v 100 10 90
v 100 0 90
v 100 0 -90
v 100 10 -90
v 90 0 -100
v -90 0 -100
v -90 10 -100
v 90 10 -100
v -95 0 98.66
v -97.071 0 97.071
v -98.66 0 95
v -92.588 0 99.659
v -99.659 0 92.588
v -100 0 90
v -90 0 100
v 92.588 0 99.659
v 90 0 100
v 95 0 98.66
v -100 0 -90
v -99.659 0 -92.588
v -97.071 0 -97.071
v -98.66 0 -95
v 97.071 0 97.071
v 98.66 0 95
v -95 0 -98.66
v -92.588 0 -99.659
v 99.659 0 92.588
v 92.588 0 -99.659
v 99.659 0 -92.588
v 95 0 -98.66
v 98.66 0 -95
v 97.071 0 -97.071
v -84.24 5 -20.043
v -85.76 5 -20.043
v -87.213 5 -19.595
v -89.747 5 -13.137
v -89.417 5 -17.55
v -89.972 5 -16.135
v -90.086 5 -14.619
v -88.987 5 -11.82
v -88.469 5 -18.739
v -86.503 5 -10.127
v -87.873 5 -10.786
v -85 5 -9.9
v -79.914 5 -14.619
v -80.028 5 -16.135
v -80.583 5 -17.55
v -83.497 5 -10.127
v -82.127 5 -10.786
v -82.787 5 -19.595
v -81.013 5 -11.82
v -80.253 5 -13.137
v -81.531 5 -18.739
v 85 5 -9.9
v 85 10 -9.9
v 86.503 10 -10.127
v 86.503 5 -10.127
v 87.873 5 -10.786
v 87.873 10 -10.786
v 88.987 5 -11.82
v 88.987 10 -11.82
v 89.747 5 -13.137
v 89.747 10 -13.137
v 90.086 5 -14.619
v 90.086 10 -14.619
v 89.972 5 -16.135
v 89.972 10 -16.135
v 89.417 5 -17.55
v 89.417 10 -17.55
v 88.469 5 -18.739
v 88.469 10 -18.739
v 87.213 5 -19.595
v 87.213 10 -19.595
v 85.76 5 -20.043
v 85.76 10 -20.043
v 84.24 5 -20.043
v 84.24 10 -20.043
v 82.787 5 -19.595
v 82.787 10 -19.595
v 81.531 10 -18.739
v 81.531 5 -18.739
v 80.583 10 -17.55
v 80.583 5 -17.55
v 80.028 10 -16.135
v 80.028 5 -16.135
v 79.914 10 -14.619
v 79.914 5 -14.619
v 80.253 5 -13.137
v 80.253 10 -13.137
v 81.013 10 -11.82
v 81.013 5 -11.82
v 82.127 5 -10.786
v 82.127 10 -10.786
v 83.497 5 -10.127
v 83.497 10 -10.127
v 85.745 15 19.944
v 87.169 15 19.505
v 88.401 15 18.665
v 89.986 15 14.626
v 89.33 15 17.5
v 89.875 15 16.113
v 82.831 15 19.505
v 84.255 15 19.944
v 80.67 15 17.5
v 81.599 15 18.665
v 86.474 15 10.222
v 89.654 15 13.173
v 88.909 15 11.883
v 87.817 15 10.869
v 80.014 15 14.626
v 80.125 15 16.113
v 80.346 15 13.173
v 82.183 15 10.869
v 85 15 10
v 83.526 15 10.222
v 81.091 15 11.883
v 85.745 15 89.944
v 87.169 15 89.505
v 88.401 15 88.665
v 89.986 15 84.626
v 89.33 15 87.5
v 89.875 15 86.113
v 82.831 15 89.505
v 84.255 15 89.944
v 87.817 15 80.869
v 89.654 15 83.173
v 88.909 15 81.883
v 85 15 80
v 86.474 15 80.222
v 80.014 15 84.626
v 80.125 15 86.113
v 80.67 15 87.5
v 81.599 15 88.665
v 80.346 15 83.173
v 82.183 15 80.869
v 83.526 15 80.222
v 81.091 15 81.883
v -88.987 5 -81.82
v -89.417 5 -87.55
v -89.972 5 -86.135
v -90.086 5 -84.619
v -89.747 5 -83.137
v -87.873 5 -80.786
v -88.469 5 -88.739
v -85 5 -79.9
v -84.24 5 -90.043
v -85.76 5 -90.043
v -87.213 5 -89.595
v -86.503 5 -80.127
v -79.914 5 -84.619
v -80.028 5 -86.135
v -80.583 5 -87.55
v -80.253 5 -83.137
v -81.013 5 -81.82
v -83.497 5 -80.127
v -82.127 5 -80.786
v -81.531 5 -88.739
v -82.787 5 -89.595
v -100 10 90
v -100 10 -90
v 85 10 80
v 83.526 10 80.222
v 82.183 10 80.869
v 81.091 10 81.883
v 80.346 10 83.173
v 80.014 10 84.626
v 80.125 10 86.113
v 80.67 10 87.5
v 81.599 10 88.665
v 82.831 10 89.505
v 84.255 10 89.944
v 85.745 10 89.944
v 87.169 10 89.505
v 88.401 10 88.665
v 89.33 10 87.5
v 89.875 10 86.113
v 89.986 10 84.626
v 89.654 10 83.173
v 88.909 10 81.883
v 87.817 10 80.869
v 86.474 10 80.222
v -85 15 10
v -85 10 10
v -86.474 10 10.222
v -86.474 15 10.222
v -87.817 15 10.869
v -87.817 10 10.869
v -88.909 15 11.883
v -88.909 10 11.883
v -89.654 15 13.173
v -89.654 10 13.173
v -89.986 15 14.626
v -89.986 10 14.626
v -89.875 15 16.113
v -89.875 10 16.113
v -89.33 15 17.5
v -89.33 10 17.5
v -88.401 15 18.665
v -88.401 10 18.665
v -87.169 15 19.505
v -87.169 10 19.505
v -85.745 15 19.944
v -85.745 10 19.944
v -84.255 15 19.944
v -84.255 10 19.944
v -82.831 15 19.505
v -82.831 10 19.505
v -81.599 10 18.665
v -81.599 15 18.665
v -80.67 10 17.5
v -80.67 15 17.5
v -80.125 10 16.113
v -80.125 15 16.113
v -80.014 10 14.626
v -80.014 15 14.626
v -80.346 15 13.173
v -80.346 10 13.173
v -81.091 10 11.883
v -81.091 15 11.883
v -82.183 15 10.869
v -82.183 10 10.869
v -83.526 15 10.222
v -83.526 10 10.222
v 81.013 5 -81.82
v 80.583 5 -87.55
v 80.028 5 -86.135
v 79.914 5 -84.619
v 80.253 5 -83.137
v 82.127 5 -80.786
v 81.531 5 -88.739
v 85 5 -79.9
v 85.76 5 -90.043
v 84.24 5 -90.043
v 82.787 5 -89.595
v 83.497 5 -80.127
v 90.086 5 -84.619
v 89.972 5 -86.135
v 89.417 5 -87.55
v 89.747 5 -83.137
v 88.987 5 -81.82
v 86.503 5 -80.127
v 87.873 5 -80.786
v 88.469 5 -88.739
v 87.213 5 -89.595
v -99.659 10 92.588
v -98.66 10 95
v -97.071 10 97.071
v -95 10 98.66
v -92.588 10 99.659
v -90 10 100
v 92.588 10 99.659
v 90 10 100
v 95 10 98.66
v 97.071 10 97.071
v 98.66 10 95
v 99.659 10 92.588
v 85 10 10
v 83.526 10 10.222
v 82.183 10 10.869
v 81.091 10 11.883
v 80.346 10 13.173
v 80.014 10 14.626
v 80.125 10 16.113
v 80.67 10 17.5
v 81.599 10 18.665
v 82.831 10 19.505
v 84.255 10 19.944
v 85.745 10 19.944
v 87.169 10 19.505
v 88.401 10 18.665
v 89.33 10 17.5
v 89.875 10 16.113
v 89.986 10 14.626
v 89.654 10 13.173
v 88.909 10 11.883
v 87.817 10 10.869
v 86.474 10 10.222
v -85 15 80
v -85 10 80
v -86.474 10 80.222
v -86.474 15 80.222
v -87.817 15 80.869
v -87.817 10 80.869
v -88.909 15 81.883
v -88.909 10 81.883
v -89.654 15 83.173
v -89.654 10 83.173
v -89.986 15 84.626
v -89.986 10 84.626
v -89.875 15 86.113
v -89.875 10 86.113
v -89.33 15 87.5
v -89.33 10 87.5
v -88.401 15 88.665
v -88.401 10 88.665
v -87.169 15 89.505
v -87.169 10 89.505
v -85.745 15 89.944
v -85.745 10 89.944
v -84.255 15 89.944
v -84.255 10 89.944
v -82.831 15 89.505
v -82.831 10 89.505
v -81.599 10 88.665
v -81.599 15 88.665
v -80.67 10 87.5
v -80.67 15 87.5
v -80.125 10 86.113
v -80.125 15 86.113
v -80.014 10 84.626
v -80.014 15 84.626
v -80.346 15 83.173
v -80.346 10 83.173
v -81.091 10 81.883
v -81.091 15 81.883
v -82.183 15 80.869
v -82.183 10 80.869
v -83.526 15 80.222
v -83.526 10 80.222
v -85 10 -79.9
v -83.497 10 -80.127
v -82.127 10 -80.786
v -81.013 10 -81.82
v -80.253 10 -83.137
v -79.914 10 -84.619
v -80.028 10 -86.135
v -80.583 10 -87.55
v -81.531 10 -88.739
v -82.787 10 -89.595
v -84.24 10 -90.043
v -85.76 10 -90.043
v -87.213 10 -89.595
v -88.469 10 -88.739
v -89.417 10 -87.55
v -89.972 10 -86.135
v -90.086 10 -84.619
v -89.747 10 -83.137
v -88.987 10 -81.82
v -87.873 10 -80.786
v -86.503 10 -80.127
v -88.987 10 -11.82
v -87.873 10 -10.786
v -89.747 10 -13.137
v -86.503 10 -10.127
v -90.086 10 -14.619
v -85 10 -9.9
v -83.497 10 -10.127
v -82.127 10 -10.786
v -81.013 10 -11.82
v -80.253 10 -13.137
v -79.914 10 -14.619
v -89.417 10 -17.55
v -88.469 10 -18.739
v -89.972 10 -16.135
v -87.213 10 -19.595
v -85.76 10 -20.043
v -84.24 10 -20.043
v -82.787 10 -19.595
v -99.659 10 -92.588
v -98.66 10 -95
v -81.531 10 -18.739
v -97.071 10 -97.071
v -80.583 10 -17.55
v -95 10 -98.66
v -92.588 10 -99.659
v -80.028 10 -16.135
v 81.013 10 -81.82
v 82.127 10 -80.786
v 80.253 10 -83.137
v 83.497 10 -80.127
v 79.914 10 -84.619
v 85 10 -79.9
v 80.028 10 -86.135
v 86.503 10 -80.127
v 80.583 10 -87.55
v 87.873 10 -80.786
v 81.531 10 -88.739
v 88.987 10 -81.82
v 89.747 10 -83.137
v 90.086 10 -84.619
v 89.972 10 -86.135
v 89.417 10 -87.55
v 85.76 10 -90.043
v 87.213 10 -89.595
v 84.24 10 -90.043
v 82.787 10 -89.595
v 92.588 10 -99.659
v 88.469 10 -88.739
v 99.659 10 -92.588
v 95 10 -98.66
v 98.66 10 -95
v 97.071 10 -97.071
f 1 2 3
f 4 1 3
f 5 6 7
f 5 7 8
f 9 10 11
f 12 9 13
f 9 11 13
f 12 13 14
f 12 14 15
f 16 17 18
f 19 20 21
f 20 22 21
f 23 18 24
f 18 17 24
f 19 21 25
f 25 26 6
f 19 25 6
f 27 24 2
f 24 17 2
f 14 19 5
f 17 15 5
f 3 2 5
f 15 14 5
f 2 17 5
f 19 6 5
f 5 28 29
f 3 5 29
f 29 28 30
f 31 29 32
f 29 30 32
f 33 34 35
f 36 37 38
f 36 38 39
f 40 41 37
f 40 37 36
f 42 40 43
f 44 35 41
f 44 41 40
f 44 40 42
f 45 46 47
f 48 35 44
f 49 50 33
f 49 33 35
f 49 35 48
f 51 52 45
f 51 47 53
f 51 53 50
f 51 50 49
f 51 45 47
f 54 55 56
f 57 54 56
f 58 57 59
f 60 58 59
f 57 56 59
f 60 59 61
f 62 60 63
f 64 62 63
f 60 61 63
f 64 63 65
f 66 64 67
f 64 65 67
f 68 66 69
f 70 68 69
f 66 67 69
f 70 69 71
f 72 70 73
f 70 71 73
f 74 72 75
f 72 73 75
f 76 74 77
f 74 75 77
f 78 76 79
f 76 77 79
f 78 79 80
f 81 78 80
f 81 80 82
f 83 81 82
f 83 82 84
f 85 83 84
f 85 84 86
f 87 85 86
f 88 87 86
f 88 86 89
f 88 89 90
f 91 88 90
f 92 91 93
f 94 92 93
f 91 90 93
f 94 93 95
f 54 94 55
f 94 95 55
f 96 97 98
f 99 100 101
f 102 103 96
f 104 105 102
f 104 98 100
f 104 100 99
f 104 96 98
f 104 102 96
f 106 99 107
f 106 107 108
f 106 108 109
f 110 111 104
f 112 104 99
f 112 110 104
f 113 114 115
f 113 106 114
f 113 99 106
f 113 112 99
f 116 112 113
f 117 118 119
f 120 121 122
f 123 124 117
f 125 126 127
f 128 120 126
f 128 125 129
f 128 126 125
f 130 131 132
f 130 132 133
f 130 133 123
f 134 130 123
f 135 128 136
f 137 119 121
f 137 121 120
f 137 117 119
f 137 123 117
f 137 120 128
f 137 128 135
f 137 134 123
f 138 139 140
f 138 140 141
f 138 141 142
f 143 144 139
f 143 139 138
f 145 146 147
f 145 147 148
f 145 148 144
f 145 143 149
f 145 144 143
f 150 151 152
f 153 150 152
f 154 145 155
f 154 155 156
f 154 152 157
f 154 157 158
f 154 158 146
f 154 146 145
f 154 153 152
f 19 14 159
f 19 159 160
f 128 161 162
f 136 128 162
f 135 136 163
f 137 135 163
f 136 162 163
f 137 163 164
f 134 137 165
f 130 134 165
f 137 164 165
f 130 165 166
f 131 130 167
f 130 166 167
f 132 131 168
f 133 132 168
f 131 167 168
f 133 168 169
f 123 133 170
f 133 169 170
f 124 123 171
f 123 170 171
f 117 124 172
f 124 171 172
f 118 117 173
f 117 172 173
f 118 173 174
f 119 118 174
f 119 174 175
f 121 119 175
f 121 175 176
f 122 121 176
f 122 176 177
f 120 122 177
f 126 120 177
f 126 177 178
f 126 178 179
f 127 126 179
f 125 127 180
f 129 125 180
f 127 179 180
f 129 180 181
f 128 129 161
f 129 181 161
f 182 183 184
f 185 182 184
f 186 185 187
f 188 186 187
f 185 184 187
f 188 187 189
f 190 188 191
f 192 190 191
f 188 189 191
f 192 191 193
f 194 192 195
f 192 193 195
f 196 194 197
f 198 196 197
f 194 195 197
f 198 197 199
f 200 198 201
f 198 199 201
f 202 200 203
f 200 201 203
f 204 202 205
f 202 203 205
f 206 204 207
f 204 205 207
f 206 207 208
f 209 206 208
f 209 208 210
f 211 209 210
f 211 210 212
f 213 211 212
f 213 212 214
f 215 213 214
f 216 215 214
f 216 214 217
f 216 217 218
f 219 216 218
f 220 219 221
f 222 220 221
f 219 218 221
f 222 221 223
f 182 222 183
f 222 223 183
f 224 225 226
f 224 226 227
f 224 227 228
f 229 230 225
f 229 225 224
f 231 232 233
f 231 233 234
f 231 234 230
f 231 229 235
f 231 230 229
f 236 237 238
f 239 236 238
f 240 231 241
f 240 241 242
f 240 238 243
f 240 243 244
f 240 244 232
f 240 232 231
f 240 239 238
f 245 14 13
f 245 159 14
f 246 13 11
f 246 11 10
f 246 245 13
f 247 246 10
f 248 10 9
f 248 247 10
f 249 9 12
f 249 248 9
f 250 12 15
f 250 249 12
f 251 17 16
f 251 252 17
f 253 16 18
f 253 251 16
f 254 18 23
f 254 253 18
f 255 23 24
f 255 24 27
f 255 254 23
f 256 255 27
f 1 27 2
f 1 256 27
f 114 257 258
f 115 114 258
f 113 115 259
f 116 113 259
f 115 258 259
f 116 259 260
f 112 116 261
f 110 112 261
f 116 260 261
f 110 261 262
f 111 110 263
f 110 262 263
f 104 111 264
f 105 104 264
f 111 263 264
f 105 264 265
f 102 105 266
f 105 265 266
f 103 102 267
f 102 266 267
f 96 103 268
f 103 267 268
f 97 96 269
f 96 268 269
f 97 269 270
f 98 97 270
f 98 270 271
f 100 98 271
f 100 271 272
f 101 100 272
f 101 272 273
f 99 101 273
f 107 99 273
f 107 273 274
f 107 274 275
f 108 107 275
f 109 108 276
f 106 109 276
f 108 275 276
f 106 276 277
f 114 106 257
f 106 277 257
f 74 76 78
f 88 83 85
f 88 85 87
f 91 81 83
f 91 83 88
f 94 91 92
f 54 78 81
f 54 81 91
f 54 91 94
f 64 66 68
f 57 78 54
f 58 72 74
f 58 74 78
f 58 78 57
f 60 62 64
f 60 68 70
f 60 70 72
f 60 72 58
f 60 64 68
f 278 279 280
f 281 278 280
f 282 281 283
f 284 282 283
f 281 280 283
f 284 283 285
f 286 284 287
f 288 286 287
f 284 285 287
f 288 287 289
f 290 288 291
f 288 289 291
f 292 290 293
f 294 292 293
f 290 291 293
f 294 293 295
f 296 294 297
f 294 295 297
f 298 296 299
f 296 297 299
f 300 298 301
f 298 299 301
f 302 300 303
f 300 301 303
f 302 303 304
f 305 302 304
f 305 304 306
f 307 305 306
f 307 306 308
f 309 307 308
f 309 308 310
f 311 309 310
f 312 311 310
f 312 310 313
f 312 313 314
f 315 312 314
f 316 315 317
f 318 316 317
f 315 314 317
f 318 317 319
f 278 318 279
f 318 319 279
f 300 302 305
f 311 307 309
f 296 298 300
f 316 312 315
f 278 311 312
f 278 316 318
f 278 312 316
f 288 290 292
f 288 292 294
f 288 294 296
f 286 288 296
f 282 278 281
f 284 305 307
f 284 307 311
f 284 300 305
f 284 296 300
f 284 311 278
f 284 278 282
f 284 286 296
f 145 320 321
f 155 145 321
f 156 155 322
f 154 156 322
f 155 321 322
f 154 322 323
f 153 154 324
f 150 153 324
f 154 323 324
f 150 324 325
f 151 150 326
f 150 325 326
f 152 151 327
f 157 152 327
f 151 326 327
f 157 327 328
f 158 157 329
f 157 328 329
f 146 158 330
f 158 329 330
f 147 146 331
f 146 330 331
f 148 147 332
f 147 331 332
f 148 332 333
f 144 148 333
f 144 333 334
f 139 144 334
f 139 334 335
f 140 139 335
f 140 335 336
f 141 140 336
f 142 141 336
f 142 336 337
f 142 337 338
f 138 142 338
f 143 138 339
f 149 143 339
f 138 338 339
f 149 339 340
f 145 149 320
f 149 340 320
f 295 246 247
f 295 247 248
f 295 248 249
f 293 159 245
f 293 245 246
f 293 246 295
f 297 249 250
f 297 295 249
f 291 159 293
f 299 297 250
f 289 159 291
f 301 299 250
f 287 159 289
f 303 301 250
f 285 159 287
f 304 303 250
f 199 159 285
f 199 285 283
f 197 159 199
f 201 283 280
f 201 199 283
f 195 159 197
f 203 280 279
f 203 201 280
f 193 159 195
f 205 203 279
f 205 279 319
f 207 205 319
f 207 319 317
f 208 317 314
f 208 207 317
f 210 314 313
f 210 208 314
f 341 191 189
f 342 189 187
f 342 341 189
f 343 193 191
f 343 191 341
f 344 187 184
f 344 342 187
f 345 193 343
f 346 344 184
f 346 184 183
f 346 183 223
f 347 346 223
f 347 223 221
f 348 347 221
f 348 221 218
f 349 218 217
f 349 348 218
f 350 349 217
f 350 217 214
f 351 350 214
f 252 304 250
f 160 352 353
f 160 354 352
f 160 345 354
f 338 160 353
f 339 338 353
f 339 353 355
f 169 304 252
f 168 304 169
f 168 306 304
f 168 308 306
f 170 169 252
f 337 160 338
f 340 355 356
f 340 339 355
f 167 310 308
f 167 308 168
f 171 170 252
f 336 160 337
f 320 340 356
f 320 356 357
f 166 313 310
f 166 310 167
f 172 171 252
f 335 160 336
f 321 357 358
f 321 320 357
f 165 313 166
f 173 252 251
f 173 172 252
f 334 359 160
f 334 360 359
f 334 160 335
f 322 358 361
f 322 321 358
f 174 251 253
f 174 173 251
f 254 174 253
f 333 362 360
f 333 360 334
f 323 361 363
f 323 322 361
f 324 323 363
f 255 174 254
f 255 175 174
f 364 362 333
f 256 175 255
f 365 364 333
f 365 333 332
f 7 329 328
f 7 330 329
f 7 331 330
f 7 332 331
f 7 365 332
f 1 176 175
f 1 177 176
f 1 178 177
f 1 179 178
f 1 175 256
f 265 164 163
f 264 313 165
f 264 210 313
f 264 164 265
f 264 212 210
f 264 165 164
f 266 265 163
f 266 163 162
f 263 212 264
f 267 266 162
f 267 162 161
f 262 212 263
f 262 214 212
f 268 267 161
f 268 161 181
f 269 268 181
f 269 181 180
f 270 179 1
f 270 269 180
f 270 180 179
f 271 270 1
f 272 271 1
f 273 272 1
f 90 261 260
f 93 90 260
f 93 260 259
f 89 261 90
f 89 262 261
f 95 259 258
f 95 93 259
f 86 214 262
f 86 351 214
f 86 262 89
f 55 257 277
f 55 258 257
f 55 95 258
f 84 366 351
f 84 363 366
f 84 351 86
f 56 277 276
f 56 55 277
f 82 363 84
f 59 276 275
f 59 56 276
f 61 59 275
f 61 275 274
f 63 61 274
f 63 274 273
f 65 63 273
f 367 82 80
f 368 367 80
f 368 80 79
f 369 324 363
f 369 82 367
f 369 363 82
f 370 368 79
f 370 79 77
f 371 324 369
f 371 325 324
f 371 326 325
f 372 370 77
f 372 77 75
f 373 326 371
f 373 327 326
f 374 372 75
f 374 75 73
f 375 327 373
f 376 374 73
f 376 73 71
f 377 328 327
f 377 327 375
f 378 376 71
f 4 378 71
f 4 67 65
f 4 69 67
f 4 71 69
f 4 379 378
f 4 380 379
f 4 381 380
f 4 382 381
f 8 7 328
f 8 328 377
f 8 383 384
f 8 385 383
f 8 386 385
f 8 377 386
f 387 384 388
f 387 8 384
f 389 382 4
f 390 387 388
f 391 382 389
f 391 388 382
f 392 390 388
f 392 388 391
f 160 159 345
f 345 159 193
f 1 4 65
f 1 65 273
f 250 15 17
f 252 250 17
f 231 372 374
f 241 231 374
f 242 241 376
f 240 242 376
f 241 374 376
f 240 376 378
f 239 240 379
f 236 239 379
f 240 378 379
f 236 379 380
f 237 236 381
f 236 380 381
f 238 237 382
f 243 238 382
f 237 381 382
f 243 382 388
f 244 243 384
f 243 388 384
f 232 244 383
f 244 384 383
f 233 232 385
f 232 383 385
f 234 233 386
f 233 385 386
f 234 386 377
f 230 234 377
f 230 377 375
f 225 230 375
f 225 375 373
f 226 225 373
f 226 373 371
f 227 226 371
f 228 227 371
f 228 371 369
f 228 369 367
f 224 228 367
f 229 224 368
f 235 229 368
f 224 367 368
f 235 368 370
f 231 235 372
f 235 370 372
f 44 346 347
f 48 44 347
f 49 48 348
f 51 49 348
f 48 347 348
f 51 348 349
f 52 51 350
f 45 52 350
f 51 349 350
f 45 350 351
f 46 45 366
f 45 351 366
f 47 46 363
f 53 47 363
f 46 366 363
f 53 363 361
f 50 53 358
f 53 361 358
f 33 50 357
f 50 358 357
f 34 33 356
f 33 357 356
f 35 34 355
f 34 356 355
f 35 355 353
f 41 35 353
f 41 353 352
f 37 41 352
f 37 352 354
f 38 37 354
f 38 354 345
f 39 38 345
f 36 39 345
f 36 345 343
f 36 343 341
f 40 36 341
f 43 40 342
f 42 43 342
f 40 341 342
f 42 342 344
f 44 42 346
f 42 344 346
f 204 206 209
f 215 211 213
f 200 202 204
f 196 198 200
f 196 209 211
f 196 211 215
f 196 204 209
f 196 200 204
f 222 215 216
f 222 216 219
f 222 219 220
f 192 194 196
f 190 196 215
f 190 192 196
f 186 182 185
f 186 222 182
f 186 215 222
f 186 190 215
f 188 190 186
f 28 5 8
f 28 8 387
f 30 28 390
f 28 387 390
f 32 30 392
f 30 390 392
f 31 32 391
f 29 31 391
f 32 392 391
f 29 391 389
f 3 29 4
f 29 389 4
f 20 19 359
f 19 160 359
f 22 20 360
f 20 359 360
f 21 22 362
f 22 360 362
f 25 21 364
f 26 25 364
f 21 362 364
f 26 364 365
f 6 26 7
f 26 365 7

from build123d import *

# Parameters (mm, degrees)
SKETCH_1_W          = 200
SKETCH_1_H          = 200
EXTRUDE_1_DEPTH     = 10
SKETCH_2_R          = 5
EXTRUDE_2_DEPTH     = 5
FILLET_1_R          = 10
SKETCH_3_R          = 5.1
CUT_EXTRUDE_1_DEPTH = 5


with BuildPart() as part:
    # ｽｹｯﾁ1 → ﾎﾞｽ - 押し出し1 (new body)
    with BuildSketch(Plane(origin=(0, 0, 0), x_dir=(1, 0, 0), z_dir=(0, 1, 0))):
        Rectangle(SKETCH_1_W, SKETCH_1_H)
    extrude(amount=EXTRUDE_1_DEPTH)

    # ｽｹｯﾁ2 → ﾎﾞｽ - 押し出し2 (add)
    with BuildSketch(Plane(origin=(0, 10, 0), x_dir=(1, 0, 0), z_dir=(0, 1, 0))):
        with Locations(Location((-85, -15, 0), (0, 0, 90))):
            Circle(SKETCH_2_R)
        with Locations(Location((-85, -85, 0), (0, 0, 90))):
            Circle(SKETCH_2_R)
        with Locations(Location((85, -85, 0), (0, 0, 90))):
            Circle(SKETCH_2_R)
        with Locations(Location((85, -15, 0), (0, 0, 90))):
            Circle(SKETCH_2_R)
    extrude(amount=EXTRUDE_2_DEPTH)

    # ﾌｨﾚｯﾄ1
    fillet_1_edges = [part.edges().sort_by_distance(p)[0] for p in [
        (100, 5, 100),
        (-100, 5, 100),
        (-100, 5, -100),
        (100, 5, -100),
    ]]
    fillet(fillet_1_edges, radius=FILLET_1_R)

    # ｽｹｯﾁ3 → ｶｯﾄ - 押し出し1 (cut)
    with BuildSketch(Plane(origin=(0, 10, 0), x_dir=(1, 0, 0), z_dir=(0, 1, 0))):
        with Locations(Location((-85, 85, 0), (0, 0, 270))):
            Circle(SKETCH_3_R)
        with Locations(Location((85, 85, 0), (0, 0, 270))):
            Circle(SKETCH_3_R)
        with Locations(Location((-85, 15, 0), (0, 0, 270))):
            Circle(SKETCH_3_R)
        with Locations(Location((85, 15, 0), (0, 0, 270))):
            Circle(SKETCH_3_R)
    extrude(amount=-CUT_EXTRUDE_1_DEPTH, mode=Mode.SUBTRACT)


solid = part.part
